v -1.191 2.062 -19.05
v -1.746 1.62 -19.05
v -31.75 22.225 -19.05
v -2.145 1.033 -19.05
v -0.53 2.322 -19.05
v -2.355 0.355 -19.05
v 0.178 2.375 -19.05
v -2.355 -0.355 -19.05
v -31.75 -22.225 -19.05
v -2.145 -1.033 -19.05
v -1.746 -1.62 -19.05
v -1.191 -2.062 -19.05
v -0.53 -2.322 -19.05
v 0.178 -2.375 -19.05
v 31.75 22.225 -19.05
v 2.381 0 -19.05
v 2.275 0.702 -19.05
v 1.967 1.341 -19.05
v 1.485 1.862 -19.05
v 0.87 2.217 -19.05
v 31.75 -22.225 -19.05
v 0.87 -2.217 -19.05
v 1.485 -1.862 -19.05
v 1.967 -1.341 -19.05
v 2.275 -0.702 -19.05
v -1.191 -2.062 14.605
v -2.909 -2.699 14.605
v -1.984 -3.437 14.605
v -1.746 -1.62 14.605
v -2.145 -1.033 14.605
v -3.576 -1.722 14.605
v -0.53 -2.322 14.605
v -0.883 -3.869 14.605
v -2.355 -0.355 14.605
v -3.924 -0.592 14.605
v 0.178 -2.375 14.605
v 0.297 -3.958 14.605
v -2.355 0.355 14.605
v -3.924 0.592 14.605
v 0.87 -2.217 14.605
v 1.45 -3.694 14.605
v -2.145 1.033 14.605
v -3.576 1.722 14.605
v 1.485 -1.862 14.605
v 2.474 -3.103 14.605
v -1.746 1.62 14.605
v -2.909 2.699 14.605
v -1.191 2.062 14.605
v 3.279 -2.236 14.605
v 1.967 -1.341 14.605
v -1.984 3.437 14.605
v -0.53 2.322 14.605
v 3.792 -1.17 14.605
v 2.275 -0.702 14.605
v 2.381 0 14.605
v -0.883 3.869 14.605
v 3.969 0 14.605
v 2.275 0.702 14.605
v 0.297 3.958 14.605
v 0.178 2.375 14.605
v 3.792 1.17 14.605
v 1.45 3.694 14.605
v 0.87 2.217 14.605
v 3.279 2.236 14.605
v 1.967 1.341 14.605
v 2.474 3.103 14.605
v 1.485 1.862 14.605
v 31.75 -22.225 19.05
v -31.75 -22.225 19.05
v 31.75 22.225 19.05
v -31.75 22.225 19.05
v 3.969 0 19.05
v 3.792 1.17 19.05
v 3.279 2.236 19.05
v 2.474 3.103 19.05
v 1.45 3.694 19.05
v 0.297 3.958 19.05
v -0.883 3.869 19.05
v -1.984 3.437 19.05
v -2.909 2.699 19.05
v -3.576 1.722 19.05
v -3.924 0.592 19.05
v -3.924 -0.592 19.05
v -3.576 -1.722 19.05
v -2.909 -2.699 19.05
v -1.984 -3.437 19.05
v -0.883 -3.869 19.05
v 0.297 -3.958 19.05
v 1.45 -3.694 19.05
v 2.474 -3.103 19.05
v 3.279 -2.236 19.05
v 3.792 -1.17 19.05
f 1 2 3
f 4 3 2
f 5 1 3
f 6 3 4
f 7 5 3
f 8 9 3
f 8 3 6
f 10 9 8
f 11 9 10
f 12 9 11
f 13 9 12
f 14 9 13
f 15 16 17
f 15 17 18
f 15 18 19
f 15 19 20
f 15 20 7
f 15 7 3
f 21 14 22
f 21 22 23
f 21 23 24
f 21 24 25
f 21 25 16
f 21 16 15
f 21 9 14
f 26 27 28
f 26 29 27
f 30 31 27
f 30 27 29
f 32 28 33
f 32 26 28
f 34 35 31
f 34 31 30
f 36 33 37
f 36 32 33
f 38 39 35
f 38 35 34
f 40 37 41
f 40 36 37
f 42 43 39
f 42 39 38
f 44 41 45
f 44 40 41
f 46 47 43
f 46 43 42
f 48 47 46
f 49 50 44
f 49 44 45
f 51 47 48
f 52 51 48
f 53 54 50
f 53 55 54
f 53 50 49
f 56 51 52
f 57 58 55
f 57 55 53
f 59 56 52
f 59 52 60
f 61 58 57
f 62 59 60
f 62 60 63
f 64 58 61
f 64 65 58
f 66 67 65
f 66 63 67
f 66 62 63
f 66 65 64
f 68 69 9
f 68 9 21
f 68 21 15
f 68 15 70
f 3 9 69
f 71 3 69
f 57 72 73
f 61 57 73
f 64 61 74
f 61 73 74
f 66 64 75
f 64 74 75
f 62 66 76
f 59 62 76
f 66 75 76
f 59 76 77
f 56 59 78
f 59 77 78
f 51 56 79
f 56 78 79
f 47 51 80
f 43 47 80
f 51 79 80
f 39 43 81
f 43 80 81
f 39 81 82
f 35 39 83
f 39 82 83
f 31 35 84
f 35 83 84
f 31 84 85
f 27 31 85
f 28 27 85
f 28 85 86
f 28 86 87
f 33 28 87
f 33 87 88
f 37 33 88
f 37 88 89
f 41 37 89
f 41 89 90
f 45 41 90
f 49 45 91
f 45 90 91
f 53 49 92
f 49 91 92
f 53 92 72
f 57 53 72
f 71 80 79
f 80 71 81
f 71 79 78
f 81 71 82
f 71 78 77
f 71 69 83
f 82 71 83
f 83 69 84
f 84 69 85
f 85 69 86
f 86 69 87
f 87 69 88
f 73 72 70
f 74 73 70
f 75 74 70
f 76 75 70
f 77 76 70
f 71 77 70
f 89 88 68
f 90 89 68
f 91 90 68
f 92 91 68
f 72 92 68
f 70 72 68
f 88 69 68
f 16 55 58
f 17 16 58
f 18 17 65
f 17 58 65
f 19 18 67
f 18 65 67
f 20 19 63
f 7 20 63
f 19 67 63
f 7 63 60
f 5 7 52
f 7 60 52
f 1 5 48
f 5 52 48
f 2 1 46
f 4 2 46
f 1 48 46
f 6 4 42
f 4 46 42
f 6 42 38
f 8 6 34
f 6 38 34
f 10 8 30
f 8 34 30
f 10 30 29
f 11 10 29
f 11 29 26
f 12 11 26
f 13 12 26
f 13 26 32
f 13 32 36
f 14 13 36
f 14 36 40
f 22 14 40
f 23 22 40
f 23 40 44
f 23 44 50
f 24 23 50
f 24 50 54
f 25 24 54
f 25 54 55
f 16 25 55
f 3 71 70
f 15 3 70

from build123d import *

# Parameters (mm, degrees)
F0_W     = 63.5
F0_H     = 38.1
F1_DEPTH = 22.225
F2_R     = 3.96875
F3_DEPTH = 4.445
F4_R     = 2.38125
F5_DEPTH = 33.656


with BuildPart() as f1:
    # F0 (on Front) → F1 (new body, symmetric)
    with BuildSketch(Plane.XZ):
        Rectangle(F0_W, F0_H)
    extrude(amount=F1_DEPTH, both=True)

    # F2 (on face) → F3 (cut)
    with BuildSketch(Plane.XY.offset(19.05)):
        Circle(F2_R)
    extrude(amount=-F3_DEPTH, mode=Mode.SUBTRACT)

    # F4 (on face) → F5 (cut, through all)
    with BuildSketch(Plane.XY.offset(14.605)):
        Circle(F4_R)
    extrude(amount=-F5_DEPTH, mode=Mode.SUBTRACT)


solid = f1.part
